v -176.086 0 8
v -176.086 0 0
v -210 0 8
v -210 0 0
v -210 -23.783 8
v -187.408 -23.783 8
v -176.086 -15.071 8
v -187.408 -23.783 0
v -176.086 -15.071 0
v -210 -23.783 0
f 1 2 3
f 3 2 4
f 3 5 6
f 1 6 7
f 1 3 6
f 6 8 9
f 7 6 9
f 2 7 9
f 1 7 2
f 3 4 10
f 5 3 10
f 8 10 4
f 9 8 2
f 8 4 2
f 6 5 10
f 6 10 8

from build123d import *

# Parameters (mm, degrees)
EXTRUDE_1_DEPTH     = 8
SKETCH_2_W          = 25.296907813
SKETCH_2_H          = 21.985442263
SKETCH_2_W_2        = 19.585718922
SKETCH_2_H_2        = 21.456908972
CUT_EXTRUDE_1_DEPTH = 215.146433821


with BuildPart() as part:
    # Эскиз1 → Вытянуть1 (new body)
    with BuildSketch(Plane.XY):
        Polygon((-210.000000639, 0), (-210.000000639, -41.166671594), (-156.500000575, 0), align=None)
    extrude(amount=EXTRUDE_1_DEPTH)

    # Эскиз2 → Вырез-Вытянуть1 (cut, through all)
    with BuildSketch(Plane.XY.offset(8)):
        with Locations((-197.351546733, -34.775510048)):
            Rectangle(SKETCH_2_W, SKETCH_2_H)
        with Locations((-166.292859318, -6.126894901)):
            Rectangle(SKETCH_2_W_2, SKETCH_2_H_2)
    extrude(amount=-CUT_EXTRUDE_1_DEPTH, mode=Mode.SUBTRACT)


solid = part.part
